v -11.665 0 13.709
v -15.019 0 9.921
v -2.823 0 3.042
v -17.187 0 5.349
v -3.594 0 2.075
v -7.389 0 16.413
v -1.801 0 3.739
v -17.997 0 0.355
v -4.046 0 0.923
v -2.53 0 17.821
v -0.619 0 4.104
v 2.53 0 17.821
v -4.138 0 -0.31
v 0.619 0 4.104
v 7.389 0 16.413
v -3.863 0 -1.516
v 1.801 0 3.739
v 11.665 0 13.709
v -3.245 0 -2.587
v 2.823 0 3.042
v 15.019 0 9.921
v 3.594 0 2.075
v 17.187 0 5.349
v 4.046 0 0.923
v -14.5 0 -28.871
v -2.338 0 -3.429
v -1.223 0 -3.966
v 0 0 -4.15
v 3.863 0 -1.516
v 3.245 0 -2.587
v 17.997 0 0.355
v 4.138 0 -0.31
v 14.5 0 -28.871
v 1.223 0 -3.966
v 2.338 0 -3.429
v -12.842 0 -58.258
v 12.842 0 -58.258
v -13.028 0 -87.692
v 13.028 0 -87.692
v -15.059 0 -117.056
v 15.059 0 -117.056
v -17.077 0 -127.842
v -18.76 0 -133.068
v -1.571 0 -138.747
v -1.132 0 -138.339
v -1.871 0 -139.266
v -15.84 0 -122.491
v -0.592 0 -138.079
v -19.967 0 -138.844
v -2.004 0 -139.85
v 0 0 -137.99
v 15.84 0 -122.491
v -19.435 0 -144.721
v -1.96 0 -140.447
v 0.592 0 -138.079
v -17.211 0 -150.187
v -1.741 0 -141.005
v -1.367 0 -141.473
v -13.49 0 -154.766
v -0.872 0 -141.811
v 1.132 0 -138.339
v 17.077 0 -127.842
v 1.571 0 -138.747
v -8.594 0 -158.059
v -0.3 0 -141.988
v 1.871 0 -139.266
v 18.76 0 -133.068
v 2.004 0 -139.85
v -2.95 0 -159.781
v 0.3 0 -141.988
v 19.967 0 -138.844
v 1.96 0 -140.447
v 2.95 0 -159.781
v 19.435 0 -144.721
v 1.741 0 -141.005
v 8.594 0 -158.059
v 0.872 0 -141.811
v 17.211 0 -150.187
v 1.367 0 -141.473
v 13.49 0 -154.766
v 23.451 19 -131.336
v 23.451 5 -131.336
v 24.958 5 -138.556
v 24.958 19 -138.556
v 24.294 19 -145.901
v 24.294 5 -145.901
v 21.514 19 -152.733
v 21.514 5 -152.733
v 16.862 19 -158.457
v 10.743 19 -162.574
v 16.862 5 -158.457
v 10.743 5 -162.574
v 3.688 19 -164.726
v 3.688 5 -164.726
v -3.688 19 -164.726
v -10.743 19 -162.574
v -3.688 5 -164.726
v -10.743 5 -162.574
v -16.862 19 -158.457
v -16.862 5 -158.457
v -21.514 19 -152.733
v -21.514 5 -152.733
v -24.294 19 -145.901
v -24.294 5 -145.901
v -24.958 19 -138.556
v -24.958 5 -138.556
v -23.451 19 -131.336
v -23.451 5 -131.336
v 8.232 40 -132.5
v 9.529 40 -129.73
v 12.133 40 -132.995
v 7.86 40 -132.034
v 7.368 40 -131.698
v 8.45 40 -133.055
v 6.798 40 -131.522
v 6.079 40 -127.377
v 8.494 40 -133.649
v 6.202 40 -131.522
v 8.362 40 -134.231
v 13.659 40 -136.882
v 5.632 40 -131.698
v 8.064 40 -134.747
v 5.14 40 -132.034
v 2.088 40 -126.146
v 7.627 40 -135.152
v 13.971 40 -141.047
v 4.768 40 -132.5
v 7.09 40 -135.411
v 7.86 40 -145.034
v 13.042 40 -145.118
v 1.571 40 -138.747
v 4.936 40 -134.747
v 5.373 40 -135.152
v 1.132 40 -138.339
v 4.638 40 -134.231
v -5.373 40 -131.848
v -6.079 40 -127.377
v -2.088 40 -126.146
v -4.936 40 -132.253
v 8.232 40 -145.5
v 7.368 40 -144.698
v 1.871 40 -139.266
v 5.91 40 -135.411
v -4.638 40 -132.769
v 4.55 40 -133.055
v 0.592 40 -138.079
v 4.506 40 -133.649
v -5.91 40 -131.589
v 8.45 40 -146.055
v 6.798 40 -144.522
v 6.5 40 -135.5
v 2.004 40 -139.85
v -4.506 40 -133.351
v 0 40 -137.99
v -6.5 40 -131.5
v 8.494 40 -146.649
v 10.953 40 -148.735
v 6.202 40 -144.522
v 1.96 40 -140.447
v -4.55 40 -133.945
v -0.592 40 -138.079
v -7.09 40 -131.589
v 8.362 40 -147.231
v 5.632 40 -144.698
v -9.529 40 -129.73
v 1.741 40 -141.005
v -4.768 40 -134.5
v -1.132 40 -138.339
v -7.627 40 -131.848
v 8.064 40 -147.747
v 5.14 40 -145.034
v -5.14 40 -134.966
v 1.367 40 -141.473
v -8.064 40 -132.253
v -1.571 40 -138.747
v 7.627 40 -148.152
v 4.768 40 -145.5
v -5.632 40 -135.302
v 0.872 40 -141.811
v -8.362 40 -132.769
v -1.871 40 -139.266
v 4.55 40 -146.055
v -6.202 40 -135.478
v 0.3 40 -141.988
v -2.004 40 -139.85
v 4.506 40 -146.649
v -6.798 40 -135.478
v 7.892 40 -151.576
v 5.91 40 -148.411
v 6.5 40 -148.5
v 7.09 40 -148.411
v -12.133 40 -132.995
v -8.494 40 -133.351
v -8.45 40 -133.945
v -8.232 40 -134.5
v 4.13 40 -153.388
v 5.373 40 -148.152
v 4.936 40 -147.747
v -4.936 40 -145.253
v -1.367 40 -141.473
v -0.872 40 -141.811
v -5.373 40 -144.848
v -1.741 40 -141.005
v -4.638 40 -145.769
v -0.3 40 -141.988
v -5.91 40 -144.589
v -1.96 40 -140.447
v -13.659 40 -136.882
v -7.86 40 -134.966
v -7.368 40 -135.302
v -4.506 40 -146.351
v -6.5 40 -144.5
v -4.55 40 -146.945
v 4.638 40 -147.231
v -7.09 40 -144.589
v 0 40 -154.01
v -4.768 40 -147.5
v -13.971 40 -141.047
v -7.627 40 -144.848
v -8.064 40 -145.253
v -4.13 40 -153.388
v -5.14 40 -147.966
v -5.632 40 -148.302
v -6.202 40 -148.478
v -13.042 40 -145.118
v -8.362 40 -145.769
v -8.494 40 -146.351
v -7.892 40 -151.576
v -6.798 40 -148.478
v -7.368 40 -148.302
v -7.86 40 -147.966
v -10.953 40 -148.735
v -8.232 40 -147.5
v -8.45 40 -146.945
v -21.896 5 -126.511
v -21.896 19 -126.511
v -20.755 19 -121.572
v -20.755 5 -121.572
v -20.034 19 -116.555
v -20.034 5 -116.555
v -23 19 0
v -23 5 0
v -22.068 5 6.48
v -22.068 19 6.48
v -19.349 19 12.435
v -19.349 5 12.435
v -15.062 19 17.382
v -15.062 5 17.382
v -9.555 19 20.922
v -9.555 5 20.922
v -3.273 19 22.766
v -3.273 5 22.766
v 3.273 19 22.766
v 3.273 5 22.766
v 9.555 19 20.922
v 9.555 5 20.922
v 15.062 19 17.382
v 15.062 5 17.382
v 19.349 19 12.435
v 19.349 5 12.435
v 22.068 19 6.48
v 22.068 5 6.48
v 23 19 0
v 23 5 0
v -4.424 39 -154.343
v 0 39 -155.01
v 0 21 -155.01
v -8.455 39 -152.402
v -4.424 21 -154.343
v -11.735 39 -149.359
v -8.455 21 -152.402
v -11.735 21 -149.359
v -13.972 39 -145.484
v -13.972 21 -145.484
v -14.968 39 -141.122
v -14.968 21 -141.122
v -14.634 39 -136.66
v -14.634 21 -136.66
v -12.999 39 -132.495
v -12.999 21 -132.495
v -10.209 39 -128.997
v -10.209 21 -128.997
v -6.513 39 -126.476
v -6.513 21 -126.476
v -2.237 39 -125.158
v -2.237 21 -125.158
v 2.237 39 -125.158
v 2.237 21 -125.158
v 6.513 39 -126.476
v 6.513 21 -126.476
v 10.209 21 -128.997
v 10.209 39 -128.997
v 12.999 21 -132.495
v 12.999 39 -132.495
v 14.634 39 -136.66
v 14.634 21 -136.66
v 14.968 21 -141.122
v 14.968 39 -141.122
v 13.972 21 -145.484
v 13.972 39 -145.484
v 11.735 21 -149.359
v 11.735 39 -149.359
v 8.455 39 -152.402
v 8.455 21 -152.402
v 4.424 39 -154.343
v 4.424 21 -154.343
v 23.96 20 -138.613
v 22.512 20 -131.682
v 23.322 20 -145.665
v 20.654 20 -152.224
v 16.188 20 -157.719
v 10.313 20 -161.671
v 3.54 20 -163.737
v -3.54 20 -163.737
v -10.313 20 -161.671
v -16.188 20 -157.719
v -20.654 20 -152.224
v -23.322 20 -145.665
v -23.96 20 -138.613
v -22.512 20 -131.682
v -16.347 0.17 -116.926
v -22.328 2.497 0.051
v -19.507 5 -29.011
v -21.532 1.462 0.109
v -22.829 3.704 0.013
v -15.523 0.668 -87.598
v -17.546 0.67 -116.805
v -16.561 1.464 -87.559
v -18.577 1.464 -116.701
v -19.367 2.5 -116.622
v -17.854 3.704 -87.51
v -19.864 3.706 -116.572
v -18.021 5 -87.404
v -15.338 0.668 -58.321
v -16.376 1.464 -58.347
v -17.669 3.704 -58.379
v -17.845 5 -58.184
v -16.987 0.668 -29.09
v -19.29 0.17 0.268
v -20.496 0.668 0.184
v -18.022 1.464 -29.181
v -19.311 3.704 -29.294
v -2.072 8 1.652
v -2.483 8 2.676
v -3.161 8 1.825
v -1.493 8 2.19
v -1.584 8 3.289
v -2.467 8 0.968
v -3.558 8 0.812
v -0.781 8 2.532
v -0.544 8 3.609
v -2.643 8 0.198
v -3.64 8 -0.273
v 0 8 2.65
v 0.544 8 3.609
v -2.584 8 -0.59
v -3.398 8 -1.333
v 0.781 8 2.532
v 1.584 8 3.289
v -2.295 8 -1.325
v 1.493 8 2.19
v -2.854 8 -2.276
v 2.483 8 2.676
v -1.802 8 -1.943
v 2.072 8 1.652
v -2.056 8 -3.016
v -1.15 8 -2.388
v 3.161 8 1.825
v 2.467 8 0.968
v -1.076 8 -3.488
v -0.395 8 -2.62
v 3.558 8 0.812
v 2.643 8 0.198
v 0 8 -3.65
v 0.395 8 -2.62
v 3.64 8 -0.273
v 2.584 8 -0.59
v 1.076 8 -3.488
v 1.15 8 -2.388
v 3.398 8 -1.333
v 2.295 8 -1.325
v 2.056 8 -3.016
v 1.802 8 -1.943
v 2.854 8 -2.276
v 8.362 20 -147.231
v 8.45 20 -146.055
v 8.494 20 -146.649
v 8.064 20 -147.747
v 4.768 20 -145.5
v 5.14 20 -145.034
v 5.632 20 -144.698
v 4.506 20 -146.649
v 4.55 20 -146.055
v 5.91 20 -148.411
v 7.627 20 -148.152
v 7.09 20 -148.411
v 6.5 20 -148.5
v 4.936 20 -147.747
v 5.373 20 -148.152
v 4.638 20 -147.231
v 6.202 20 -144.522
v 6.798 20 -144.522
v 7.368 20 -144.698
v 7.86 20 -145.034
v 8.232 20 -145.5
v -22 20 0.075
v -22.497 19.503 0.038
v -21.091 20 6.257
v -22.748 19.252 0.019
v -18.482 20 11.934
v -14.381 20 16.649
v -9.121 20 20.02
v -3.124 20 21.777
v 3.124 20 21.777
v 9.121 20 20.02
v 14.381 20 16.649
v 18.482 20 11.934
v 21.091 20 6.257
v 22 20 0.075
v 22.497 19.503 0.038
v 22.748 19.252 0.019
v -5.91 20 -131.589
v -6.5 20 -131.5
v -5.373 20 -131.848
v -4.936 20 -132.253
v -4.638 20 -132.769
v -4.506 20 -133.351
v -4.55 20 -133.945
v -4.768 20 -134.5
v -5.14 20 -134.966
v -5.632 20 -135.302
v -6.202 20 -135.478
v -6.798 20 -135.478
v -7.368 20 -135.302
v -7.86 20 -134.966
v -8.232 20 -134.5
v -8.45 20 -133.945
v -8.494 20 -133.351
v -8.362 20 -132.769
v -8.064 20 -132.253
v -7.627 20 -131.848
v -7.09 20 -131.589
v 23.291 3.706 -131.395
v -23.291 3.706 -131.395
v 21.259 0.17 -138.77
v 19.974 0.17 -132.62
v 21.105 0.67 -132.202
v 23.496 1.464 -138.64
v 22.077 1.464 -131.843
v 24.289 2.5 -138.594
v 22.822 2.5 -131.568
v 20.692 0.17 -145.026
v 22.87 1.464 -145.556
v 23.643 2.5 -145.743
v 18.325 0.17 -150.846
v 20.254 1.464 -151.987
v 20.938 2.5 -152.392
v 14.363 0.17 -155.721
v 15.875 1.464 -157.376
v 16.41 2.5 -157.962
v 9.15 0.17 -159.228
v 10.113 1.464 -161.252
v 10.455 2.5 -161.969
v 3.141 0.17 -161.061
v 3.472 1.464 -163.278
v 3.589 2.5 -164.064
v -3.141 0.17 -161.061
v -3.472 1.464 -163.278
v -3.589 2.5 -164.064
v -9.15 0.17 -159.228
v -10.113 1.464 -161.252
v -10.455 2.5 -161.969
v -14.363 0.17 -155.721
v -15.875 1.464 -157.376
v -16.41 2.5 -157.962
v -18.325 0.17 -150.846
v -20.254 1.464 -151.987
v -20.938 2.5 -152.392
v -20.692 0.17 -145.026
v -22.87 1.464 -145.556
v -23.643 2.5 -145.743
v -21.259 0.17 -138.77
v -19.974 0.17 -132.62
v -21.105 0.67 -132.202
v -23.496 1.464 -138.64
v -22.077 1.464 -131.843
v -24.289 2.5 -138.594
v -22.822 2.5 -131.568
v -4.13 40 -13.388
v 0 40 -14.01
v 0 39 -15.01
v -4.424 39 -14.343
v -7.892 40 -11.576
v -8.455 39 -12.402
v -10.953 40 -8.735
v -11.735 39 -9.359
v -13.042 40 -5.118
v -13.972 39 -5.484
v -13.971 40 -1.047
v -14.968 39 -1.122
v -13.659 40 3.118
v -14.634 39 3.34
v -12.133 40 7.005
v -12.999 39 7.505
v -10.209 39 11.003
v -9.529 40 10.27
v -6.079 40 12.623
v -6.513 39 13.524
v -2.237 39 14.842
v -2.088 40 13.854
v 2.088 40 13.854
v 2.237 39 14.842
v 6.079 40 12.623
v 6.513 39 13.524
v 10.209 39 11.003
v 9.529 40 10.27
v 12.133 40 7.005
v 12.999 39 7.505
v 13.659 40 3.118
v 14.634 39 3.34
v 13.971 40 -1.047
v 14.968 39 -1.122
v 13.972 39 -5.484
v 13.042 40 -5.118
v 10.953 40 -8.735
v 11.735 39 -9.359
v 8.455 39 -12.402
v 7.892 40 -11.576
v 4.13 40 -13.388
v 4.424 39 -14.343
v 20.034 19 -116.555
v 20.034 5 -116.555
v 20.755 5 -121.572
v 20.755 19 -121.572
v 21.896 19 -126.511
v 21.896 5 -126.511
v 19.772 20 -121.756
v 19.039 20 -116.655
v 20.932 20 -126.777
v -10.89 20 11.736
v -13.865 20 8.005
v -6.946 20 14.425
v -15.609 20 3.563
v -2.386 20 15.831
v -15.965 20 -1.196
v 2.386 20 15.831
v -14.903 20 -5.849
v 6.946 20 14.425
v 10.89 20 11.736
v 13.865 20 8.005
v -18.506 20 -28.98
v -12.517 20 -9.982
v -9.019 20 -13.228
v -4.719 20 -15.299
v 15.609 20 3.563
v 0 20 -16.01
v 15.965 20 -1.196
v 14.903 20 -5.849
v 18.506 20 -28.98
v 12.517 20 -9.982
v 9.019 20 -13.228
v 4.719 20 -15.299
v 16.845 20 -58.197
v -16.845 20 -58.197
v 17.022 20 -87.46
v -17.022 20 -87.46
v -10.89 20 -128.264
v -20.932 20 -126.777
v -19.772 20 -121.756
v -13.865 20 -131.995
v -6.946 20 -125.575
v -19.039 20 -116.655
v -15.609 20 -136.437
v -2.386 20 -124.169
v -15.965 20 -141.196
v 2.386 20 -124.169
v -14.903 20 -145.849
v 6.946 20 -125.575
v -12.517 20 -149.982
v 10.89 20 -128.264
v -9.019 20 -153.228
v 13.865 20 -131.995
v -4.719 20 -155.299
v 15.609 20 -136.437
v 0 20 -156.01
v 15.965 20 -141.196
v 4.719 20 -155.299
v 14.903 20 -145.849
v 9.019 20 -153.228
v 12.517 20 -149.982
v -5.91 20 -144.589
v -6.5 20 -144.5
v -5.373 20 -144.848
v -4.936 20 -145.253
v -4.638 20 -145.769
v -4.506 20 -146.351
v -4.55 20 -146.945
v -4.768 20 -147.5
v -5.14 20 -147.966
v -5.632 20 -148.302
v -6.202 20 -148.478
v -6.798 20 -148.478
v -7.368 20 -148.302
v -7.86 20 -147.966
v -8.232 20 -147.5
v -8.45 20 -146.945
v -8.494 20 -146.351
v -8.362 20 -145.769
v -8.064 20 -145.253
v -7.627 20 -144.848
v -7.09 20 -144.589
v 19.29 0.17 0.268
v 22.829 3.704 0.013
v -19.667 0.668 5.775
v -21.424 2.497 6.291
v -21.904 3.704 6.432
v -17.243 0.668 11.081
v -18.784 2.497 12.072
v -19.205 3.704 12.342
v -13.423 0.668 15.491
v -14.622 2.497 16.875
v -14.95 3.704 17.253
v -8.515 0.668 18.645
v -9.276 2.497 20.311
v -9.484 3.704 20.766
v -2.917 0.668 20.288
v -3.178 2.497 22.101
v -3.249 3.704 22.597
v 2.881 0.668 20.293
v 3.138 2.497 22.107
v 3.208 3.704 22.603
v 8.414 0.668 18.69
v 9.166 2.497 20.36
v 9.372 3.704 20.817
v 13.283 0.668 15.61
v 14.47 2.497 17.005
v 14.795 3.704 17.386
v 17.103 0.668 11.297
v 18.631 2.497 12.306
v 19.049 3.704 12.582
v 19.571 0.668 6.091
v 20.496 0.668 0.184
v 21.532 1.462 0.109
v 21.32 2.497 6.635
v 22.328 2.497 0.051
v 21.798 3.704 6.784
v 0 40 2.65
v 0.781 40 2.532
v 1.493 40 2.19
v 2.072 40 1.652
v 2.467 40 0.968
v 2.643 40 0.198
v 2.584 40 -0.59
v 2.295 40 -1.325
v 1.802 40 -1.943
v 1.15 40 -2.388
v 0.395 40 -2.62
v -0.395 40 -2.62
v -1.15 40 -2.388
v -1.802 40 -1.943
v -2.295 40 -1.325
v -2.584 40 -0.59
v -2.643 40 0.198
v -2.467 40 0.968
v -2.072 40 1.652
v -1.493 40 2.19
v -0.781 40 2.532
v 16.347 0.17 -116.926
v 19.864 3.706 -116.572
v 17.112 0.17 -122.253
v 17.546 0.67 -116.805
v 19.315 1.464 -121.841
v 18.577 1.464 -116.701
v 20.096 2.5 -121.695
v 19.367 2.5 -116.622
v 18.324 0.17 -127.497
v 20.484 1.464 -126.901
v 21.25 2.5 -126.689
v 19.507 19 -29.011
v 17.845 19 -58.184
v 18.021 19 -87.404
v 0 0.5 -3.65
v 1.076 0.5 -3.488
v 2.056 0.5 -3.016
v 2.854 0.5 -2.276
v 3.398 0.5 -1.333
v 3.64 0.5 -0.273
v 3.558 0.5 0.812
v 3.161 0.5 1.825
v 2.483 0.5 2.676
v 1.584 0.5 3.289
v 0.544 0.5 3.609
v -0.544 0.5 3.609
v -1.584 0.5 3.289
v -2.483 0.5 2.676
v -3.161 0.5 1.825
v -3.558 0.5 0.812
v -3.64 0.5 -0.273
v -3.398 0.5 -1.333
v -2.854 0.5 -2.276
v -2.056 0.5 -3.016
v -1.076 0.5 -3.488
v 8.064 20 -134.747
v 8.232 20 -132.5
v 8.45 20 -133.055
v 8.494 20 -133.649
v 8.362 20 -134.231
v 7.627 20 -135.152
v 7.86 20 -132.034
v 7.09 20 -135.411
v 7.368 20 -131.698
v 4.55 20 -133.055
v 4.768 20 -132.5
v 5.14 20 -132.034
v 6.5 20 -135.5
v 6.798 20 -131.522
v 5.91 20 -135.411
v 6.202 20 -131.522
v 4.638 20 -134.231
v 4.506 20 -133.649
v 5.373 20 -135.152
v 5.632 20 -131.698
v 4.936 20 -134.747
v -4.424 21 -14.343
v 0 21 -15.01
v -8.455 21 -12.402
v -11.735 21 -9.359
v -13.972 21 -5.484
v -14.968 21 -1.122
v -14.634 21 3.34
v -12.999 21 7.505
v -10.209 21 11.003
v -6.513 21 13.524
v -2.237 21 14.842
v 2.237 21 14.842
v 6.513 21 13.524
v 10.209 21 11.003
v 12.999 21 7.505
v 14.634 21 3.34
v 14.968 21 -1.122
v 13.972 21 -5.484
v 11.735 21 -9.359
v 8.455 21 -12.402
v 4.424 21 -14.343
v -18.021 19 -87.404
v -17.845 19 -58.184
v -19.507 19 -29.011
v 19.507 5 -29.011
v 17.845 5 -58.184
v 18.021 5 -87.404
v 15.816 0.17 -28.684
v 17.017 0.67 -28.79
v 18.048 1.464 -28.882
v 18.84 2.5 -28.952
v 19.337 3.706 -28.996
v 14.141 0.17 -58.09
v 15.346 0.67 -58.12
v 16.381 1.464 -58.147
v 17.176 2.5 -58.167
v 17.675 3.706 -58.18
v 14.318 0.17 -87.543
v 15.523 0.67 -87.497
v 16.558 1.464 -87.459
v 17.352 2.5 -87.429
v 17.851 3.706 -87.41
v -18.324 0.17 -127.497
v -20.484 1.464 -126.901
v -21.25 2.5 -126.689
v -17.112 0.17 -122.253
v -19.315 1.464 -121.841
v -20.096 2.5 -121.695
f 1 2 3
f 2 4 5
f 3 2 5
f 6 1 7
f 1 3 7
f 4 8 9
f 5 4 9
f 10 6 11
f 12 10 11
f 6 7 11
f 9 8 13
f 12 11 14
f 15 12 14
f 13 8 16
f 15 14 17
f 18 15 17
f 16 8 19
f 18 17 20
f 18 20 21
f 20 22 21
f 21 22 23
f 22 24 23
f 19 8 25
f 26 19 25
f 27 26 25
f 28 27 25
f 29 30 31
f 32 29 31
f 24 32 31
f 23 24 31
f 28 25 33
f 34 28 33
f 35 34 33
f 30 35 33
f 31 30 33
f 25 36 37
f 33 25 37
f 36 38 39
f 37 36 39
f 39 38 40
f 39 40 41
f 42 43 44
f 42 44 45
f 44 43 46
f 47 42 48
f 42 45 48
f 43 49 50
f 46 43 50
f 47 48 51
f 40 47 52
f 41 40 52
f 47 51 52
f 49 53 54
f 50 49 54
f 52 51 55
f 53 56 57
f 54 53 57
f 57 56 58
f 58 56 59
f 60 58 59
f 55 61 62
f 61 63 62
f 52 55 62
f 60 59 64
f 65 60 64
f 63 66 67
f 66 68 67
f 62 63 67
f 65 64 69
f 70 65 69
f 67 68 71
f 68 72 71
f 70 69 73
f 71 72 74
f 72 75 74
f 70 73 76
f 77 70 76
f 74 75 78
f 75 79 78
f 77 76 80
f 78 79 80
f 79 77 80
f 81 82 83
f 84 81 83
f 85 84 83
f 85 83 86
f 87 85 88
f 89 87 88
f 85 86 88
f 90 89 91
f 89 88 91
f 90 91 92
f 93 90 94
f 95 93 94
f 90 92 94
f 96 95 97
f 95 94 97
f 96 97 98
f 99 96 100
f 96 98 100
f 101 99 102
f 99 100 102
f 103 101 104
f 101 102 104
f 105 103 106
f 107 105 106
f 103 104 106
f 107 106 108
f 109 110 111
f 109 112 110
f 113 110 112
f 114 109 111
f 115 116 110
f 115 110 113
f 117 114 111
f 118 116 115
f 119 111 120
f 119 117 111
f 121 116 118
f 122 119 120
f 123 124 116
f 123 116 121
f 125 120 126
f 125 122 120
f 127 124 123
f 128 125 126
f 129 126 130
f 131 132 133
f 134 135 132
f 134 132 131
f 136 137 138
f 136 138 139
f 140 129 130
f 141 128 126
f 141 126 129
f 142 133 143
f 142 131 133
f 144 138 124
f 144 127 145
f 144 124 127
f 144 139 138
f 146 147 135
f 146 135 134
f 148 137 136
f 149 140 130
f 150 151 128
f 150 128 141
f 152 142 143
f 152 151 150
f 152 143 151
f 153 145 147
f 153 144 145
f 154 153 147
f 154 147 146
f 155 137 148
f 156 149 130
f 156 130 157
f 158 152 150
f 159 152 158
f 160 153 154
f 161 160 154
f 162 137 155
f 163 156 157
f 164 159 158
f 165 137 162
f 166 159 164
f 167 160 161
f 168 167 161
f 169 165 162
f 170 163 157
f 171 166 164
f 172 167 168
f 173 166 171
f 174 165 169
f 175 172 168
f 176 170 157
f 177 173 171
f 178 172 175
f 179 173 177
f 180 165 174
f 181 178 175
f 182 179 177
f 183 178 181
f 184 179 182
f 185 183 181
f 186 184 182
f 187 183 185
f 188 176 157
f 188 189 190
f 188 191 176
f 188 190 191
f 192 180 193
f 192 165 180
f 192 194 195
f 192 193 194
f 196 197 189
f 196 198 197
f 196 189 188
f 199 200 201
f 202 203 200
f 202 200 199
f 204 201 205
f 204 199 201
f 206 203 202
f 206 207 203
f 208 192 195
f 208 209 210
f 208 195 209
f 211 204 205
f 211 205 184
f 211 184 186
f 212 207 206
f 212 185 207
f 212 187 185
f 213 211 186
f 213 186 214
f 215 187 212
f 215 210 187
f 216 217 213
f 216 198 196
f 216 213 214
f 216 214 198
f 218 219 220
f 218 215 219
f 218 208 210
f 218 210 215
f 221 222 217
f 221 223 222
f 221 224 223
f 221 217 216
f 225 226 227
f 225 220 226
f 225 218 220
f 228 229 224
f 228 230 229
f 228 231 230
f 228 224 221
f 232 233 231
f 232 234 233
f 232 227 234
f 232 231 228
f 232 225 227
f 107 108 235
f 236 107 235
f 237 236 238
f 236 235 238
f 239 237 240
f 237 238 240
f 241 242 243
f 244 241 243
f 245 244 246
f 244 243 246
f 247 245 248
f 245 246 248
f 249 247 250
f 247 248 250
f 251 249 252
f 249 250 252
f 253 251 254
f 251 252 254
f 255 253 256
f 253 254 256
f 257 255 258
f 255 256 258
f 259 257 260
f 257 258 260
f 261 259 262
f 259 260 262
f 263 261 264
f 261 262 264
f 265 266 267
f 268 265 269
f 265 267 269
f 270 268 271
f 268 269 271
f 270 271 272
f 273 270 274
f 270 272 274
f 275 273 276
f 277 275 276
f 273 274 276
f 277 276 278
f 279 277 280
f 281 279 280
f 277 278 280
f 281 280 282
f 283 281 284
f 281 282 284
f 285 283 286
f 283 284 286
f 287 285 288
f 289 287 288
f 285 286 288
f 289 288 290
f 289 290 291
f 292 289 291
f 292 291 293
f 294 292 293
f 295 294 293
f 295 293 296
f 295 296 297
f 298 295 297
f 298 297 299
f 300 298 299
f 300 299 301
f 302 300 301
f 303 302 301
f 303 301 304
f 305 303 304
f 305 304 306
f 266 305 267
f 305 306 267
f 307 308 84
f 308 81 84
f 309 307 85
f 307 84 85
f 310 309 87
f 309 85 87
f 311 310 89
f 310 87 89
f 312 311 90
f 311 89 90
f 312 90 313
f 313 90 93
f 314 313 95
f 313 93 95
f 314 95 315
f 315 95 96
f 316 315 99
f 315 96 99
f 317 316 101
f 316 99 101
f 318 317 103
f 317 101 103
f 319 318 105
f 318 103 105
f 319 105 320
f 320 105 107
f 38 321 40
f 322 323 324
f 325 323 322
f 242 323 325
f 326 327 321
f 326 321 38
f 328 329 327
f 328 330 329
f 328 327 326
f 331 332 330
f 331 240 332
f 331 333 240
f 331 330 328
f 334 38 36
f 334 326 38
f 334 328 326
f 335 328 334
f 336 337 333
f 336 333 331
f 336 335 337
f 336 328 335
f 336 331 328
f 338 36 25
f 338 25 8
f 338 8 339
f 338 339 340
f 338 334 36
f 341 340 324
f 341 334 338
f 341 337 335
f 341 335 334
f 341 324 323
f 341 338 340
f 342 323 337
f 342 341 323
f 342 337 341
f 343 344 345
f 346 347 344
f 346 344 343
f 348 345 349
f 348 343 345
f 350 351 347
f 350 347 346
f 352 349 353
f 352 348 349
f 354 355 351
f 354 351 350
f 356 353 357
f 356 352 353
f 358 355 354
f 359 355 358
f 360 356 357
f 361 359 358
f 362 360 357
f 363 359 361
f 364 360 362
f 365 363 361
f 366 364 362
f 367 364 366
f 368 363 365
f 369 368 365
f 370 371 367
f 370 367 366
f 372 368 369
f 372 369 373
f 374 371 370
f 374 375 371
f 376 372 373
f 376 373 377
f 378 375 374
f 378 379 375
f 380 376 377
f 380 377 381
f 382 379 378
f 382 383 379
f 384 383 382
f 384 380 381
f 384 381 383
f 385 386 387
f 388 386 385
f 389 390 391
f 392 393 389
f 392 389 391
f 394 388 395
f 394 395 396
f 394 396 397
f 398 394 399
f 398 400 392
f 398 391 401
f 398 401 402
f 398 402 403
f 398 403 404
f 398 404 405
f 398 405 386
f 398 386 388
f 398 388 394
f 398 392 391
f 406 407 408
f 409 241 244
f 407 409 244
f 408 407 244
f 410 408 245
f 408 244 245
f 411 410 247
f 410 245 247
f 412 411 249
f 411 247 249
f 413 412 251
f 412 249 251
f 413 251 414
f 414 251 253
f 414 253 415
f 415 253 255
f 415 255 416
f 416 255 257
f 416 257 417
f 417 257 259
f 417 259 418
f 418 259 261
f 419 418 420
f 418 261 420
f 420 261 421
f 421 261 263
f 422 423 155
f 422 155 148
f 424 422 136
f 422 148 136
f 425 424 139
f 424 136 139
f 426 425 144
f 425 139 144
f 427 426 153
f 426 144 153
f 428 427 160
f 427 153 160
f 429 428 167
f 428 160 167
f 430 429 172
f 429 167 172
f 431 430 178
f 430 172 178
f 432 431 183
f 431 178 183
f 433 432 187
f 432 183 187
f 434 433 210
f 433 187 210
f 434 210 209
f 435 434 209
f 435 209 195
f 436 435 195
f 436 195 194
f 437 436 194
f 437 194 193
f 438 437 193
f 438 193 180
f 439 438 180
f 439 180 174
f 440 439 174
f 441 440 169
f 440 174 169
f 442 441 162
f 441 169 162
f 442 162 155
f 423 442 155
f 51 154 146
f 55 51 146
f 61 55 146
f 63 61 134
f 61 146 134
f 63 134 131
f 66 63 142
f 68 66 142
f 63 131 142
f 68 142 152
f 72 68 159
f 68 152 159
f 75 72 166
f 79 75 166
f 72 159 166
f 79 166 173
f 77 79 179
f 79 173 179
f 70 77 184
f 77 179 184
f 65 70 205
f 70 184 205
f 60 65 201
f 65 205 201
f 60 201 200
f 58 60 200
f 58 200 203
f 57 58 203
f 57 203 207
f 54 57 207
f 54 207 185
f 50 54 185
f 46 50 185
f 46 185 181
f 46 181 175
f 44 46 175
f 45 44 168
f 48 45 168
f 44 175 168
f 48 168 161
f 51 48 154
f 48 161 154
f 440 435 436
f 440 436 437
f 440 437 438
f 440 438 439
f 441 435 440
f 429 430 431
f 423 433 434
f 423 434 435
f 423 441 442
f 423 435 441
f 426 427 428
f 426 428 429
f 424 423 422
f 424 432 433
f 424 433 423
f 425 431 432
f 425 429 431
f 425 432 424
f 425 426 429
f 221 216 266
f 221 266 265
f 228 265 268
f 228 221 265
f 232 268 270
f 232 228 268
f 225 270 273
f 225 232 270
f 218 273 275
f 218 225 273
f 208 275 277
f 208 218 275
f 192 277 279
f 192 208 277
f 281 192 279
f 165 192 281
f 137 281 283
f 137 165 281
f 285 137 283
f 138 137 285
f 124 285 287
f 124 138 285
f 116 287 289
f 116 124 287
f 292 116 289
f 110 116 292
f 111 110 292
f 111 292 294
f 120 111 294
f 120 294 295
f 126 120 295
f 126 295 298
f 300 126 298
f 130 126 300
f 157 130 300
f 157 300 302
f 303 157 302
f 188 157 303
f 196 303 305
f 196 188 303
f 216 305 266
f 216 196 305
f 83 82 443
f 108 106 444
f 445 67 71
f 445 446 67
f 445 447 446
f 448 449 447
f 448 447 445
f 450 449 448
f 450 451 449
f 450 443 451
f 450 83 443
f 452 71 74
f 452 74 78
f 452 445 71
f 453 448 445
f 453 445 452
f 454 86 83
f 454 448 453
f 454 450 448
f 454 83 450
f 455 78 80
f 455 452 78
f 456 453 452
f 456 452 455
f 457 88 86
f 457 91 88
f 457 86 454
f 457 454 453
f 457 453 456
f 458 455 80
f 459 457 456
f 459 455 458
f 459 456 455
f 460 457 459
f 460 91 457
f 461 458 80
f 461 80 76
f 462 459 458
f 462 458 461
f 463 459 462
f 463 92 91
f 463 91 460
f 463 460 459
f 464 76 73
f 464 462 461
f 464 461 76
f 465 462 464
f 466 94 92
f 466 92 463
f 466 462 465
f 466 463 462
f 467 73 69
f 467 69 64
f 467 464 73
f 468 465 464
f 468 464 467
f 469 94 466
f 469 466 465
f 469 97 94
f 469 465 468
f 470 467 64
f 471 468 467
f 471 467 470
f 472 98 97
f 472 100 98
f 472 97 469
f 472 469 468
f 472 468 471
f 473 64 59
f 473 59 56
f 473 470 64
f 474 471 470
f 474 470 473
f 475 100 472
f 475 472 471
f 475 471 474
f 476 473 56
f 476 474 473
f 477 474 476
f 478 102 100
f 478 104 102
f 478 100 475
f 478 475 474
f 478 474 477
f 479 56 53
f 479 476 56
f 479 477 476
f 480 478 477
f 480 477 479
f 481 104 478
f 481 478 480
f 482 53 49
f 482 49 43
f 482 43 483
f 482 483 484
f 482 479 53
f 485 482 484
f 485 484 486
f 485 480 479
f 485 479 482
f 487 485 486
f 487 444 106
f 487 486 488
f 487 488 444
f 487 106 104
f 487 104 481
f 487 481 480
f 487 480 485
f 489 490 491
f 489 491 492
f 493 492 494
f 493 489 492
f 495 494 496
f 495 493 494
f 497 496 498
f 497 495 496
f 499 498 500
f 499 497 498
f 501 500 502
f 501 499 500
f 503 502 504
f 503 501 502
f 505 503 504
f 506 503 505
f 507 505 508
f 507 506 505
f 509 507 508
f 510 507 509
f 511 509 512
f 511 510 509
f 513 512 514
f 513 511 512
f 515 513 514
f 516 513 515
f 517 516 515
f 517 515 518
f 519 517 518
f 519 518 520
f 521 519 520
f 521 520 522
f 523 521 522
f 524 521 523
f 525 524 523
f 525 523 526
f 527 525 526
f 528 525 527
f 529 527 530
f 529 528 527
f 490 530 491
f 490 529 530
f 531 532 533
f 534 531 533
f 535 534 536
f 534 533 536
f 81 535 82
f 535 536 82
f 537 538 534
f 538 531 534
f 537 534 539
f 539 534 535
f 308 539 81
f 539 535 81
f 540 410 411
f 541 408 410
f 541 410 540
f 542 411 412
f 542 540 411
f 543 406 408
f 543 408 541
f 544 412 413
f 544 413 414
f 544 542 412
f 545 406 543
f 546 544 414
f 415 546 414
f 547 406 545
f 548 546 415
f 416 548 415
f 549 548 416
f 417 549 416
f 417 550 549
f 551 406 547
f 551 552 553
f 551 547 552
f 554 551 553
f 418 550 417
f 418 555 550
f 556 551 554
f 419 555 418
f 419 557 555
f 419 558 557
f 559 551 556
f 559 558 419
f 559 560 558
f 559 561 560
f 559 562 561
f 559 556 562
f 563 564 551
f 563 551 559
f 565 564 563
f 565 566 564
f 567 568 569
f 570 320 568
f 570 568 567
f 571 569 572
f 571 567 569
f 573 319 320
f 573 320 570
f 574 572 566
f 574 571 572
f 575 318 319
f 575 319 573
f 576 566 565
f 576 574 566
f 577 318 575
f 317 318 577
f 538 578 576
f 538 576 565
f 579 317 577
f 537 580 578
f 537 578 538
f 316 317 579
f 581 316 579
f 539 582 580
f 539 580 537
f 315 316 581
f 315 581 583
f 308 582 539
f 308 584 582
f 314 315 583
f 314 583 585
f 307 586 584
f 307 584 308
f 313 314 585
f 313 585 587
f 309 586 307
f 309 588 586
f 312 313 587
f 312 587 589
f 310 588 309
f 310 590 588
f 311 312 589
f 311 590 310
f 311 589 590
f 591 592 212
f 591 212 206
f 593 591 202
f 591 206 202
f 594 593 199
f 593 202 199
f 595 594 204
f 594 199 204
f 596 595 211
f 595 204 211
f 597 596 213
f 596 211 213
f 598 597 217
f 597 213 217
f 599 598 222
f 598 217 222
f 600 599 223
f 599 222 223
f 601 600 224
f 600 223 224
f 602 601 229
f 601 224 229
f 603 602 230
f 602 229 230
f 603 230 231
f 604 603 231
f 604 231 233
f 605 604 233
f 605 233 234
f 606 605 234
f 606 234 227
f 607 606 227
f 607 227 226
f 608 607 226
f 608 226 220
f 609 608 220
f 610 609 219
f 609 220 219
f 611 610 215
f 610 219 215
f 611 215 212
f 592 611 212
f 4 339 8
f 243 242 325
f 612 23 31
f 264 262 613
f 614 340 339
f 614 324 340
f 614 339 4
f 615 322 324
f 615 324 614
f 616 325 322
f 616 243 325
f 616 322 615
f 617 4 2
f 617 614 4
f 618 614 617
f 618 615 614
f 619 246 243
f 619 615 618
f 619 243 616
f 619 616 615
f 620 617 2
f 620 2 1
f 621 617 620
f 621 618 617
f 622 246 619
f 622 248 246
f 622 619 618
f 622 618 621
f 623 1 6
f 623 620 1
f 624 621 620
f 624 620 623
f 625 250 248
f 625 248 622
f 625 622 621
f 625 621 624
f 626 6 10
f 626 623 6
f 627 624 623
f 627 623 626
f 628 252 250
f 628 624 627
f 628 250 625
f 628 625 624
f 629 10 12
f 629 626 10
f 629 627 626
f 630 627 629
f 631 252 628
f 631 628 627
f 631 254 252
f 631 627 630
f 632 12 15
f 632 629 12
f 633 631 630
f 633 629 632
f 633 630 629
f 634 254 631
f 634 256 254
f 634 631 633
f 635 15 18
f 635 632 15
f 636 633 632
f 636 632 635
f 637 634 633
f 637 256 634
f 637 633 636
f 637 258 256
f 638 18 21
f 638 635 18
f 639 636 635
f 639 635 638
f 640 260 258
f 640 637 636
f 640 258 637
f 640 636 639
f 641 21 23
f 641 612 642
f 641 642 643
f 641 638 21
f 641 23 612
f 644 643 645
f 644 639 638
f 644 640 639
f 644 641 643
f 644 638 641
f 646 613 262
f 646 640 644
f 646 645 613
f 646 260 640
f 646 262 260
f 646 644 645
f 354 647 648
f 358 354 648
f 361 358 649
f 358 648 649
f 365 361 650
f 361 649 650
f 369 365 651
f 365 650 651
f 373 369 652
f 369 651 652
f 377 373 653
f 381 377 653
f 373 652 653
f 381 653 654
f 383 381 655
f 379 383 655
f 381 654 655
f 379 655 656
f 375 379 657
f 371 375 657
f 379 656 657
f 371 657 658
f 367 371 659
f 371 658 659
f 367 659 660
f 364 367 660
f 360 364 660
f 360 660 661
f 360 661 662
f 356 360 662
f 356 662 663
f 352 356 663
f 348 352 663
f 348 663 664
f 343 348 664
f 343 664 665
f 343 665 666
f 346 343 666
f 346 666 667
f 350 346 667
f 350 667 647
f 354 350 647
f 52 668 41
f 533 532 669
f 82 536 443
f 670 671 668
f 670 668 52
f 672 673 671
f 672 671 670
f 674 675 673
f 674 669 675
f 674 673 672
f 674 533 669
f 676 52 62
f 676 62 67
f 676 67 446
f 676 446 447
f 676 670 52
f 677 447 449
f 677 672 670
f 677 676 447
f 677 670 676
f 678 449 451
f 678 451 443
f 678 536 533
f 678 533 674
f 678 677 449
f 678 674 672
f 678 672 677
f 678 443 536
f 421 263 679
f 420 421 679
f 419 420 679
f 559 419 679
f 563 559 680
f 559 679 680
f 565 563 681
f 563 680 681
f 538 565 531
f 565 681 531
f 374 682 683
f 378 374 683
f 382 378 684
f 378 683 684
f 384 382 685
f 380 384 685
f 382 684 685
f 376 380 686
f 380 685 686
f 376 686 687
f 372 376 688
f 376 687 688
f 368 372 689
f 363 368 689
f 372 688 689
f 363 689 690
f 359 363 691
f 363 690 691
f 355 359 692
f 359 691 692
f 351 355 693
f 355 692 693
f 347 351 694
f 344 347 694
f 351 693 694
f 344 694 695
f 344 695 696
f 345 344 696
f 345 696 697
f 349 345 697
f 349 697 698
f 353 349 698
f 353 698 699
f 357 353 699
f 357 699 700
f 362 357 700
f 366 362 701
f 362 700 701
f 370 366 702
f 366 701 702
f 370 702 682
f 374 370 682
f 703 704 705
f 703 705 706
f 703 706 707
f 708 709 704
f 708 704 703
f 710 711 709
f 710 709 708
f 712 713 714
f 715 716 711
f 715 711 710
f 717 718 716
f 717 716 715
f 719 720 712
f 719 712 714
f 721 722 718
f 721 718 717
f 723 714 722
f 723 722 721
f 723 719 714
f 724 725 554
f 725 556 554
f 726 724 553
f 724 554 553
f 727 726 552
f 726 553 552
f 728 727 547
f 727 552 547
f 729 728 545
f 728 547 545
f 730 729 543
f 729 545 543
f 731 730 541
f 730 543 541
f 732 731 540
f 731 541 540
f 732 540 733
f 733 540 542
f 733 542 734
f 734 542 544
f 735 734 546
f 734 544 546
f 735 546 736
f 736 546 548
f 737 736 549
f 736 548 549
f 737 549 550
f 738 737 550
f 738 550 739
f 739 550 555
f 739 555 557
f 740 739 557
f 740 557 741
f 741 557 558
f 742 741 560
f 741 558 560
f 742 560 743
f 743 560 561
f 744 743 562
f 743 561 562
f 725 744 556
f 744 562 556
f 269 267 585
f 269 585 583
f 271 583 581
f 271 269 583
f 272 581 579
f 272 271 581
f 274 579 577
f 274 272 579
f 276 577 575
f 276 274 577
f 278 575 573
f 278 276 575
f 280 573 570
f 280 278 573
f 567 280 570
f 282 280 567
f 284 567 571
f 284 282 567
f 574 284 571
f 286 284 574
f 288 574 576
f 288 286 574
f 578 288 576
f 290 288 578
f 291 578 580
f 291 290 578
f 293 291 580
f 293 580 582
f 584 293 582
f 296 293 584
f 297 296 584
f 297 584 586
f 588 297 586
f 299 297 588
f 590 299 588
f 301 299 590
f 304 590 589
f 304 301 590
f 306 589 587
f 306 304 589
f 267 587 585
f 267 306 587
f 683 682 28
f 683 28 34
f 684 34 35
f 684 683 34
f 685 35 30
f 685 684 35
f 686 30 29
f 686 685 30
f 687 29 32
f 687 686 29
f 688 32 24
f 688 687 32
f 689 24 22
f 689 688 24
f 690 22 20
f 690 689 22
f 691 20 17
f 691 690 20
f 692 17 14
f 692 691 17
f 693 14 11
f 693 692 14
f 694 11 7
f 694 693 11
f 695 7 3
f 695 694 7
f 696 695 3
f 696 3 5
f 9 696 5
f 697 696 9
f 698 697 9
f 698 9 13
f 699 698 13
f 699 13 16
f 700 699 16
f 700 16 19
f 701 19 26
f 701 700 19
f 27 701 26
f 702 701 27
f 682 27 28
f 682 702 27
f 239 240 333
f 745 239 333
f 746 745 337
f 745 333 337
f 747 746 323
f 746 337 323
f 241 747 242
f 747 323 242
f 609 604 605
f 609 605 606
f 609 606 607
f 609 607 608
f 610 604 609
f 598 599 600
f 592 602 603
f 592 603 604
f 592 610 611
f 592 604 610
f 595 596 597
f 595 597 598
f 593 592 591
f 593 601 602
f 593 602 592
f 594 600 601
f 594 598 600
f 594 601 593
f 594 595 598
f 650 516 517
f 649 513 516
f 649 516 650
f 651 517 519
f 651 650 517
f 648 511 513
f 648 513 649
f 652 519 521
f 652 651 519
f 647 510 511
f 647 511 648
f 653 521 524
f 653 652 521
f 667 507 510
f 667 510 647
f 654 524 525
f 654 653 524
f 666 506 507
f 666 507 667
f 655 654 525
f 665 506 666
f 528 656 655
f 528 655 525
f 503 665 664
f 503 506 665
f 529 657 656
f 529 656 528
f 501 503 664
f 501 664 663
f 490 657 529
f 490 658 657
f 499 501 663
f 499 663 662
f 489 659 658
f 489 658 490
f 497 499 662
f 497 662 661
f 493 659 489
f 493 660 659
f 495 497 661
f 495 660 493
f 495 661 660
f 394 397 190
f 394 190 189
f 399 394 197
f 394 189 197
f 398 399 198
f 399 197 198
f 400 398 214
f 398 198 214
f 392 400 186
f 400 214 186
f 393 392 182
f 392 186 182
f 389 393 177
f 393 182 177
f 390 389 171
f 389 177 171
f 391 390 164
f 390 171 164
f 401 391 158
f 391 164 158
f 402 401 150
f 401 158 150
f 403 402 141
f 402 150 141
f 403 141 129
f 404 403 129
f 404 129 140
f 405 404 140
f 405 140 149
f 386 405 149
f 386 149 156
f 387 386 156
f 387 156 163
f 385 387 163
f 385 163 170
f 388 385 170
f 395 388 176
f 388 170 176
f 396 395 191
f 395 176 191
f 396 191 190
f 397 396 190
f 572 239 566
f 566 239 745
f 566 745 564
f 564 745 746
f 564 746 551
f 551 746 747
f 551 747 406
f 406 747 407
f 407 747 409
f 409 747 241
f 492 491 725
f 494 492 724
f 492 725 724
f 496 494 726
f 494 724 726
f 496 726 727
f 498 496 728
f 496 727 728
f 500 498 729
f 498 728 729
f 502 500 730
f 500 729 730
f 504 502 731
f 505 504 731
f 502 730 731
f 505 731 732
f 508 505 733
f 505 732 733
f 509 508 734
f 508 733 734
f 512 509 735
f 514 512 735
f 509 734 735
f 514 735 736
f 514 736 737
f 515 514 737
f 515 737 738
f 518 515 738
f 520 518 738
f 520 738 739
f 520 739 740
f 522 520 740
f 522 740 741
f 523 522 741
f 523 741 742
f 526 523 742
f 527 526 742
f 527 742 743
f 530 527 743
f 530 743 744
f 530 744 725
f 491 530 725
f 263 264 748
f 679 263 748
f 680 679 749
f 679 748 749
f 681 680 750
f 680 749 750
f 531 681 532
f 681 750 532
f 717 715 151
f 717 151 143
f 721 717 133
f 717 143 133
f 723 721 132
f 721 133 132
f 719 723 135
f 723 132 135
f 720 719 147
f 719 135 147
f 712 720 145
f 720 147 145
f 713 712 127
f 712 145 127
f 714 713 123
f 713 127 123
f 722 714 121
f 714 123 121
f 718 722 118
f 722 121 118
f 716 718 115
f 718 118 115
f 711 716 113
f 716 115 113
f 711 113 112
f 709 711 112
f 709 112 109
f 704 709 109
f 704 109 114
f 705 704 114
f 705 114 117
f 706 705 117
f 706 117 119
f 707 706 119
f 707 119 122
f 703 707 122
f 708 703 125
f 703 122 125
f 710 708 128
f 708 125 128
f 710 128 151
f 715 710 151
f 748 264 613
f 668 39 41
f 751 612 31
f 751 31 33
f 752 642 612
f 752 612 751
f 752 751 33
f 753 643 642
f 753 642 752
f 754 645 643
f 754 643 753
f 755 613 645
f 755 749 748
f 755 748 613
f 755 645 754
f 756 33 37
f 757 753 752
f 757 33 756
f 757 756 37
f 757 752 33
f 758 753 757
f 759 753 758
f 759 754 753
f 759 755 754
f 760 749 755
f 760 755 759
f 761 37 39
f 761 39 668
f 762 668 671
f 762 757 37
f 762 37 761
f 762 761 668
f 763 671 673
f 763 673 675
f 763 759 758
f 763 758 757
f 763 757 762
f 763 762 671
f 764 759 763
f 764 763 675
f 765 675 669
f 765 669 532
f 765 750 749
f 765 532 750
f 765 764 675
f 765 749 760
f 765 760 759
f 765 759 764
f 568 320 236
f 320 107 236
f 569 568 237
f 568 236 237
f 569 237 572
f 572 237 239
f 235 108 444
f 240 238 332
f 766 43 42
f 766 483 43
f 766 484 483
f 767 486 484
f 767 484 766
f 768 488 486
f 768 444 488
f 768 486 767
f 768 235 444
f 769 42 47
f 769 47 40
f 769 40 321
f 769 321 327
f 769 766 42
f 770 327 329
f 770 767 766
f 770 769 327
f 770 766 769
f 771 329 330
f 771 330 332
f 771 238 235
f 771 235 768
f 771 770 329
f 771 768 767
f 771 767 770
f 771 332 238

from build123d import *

# Parameters (mm, degrees)
BOSS_EXTRUDE1_DEPTH = 20
SKETCH2_R           = 15.01
BOSS_EXTRUDE2_DEPTH = 20
CHAMFER1_SIZE       = 1
CHAMFER3_SIZE       = 1
SKETCH5_R           = 2.65
CUT_EXTRUDE2_DEPTH  = 40
FILLET3_R           = 5
SKETCH6_R           = 3.65
CUT_EXTRUDE3_DEPTH  = 8
CHAMFER4_SIZE       = 0.5
SKETCH10_R          = 15.01
BOSS_EXTRUDE5_DEPTH = 20
CHAMFER5_SIZE       = 1
SKETCH11_R          = 2.0099999999999967
CUT_EXTRUDE5_DEPTH  = 40
SKETCH12_R          = 2.0000000000000018
SKETCH12_R_2        = 2.000000000000005
SKETCH12_R_3        = 1.9999999999999967
CUT_EXTRUDE6_DEPTH  = 19.999999999999996


with BuildPart() as part:
    # Sketch1 → Boss-Extrude1 (new body)
    with BuildSketch(Plane(origin=(0, 0, 0), x_dir=(1, 0, 0), z_dir=(0, 1, 0))):
        with BuildLine():
            ThreePointArc((-23, 0), (1.41e-15, -22.999999999999982), (23, 0))
            ThreePointArc((23, 0), (17.845208734768505, 58.18386045047181), (20.033890701411753, 116.55459936267802))
            ThreePointArc((20.033890701411753, 116.55459936267802), (21.27316153822275, 124.05347023326534), (23.45051159720983, 131.33550314045155))
            ThreePointArc((23.45051159720983, 131.33550314045155), (-2.067e-14, 165.00000000000006), (-23.45051159720983, 131.3355031404515))
            ThreePointArc((-23.45051159720983, 131.3355031404515), (-21.27316153822273, 124.05347023326526), (-20.033890701411725, 116.55459936267786))
            ThreePointArc((-20.033890701411725, 116.55459936267786), (-17.845208734768505, 58.1838604504716), (-23, 0))
        make_face()
    extrude(amount=BOSS_EXTRUDE1_DEPTH)

    # Sketch2 → Boss-Extrude2 (add)
    with BuildSketch(Plane(origin=(0, 20, 0), x_dir=(1, 0, 0), z_dir=(0, 1, 0))):
        with Locations(Location((0, 0, 0), (0, 0, 90))):
            Circle(SKETCH2_R)
    extrude(amount=BOSS_EXTRUDE2_DEPTH)

    # Chamfer1
    chamfer1_edges = [part.edges().sort_by_distance(p)[0] for p in [
        (-2.76e-15, 40, 15.01),
    ]]
    chamfer(chamfer1_edges, length=CHAMFER1_SIZE)

    # Chamfer3
    # the kernel refuses this chamfer: 1 mm, written as the material it adds along each edge
    with BuildSketch(Plane(origin=(0, 20, 0), x_dir=(6e-17, 0, -1), z_dir=(1, 0, 6e-17))) as chamfer3_piece_1:
        Polygon((15.01, CHAMFER3_SIZE), (15.01 + CHAMFER3_SIZE, 0), (15.01, 0), align=None)
    revolve(axis=Axis((0, 20, 0), (0, 1, 0)))
    # the kernel refuses this chamfer: 1 mm, written as the material it takes off along each edge
    with BuildSketch(Plane(origin=(-79.73173943051358, 20, -110.54071067753486), x_dir=(0.9380204638883933, 0, -0.3465798743819428), z_dir=(-0.3465798743819428, 0, -0.9380204638883933))) as chamfer3_2_piece_1:
        Polygon((60.00000000000017 + CHAMFER3_SIZE, 0), (60.00000000000017, CHAMFER3_SIZE), (60.00000000000017, 0), align=None)
    revolve(axis=Axis((-79.73173943051358, 20, -110.54071067753486), (0, -1, 0)), revolution_arc=14.525766875036835, mode=Mode.SUBTRACT)
    with BuildSketch(Plane(origin=(-482.16572850262514, 20, -70.00000000000004), x_dir=(0.9949641454850282, 0, -0.1002314780857173), z_dir=(-0.1002314780857173, 0, -0.9949641454850282))) as chamfer3_2_piece_2:
        Polygon((464.4708454051196 + CHAMFER3_SIZE, 0), (464.4708454051196, CHAMFER3_SIZE), (464.4708454051196, 0), align=None)
    revolve(axis=Axis((-482.16572850262514, 20, -70.00000000000004), (0, -1, 0)), revolution_arc=14.737763084908373, mode=Mode.SUBTRACT)
    with BuildSketch(Plane(origin=(0, 20, -1.599e-14), x_dir=(-0.9937354343699007, 0, -0.11175816067592001), z_dir=(0.11175816067592001, 0, -0.9937354343699007))) as chamfer3_2_piece_3:
        Polygon((23.000000000000004 - CHAMFER3_SIZE, 0), (23.000000000000004, -CHAMFER3_SIZE), (23.000000000000004, 0), align=None)
    revolve(axis=Axis((0, 20, -1.599e-14), (0, 1, 0)), revolution_arc=192.83335153216495, mode=Mode.SUBTRACT)
    with BuildSketch(Plane(origin=(482.16572850261997, 20, -69.99999999999986), x_dir=(-0.9877285445231084, 0, 0.15618041597544133), z_dir=(0.15618041597544133, 0, 0.9877285445231084))) as chamfer3_2_piece_4:
        Polygon((464.4708454051149 + CHAMFER3_SIZE, 0), (464.47084540511446, CHAMFER3_SIZE), (464.4708454051149, 0), align=None)
    revolve(axis=Axis((482.16572850261997, 20, -69.99999999999986), (0, -1, 0)), revolution_arc=14.737763084908554, mode=Mode.SUBTRACT)
    with BuildSketch(Plane(origin=(79.7317394305139, 20, -110.54071067753493), x_dir=(-0.9949641454850281, 0, -0.10023147808571735), z_dir=(-0.10023147808571735, 0, 0.9949641454850281))) as chamfer3_2_piece_5:
        Polygon((60.000000000000455 + CHAMFER3_SIZE, 0), (60.000000000000455, CHAMFER3_SIZE), (60.000000000000455, 0), align=None)
    revolve(axis=Axis((79.7317394305139, 20, -110.54071067753493), (0, -1, 0)), revolution_arc=14.525766875036666, mode=Mode.SUBTRACT)
    with BuildSketch(Plane(origin=(9.77e-15, 20, -140.00000000000006), x_dir=(0.9380204638883942, 0, 0.3465798743819405), z_dir=(-0.3465798743819405, 0, 0.9380204638883942))) as chamfer3_2_piece_6:
        Polygon((24.999999999999982 - CHAMFER3_SIZE, 0), (24.999999999999982, -CHAMFER3_SIZE), (24.999999999999982, 0), align=None)
    revolve(axis=Axis((9.77e-15, 20, -140.00000000000006), (0, 1, 0)), revolution_arc=220.55653408148345, mode=Mode.SUBTRACT)

    # Sketch5 → Cut-Extrude2 (cut)
    with BuildSketch(Plane(origin=(0, 40, 0), x_dir=(1, 0, 0), z_dir=(0, 1, 0))):
        with Locations(Location((0, 0, 0), (0, 0, 270))):
            Circle(SKETCH5_R)
    extrude(amount=-CUT_EXTRUDE2_DEPTH, mode=Mode.SUBTRACT)

    # Fillet3
    # the kernel refuses this fillet: 5 mm, written as the material it takes off along each edge
    with BuildSketch(Plane(origin=(482.16572850261997, 0, -69.99999999999986), x_dir=(-0.9868985080370148, 0, 0.1613422909045059), z_dir=(0.1613422909045059, 0, 0.9868985080370148))) as fillet3_piece_1:
        with BuildLine():
            CenterArc((464.4708454051144 + FILLET3_R, -FILLET3_R), FILLET3_R, 89.99999999999935, 90.00000000000068)
            Line((464.4708454051144 + FILLET3_R, 8.9e-16), (464.4708454051144 + FILLET3_R, FILLET3_R * 0.02))
            Line((464.4708454051144 + FILLET3_R, FILLET3_R * 0.02), (464.4708454051144 - FILLET3_R * 0.02, FILLET3_R * 0.02))
            Line((464.4708454051144 - FILLET3_R * 0.02, FILLET3_R * 0.02), (464.4708454051144 - FILLET3_R * 0.02, -FILLET3_R))
            Line((464.4708454051144 - FILLET3_R * 0.02, -FILLET3_R), (464.4708454051144, -FILLET3_R))
        make_face()
    revolve(axis=Axis((482.16572850261997, 0, -69.99999999999986), (0, -1, 0)), revolution_arc=15.03731633345655, mode=Mode.SUBTRACT)
    with BuildSketch(Plane(origin=(0, 0, -1.599e-14), x_dir=(-0.9763879588864252, 0, -0.21602442857603077), z_dir=(0.21602442857603077, 0, -0.9763879588864252))) as fillet3_piece_2:
        with BuildLine():
            CenterArc((23 - FILLET3_R, FILLET3_R), FILLET3_R, 269.99999999999994, 90.00000000000006)
            Line((23 - FILLET3_R, -8.9e-16), (23 - FILLET3_R, -FILLET3_R * 0.02))
            Line((23 - FILLET3_R, -FILLET3_R * 0.02), (23 + FILLET3_R * 0.02, -FILLET3_R * 0.02))
            Line((23 + FILLET3_R * 0.02, -FILLET3_R * 0.02), (23 + FILLET3_R * 0.02, FILLET3_R))
            Line((23 + FILLET3_R * 0.02, FILLET3_R), (23.000000000000004, FILLET3_R))
        make_face()
    revolve(axis=Axis((0, 0, -1.599e-14), (0, 1, 0)), revolution_arc=204.95127041750123, mode=Mode.SUBTRACT)
    with BuildSketch(Plane(origin=(-482.16572850262514, 0, -70.00000000000004), x_dir=(0.9949641454850282, 0, -0.1002314780857173), z_dir=(-0.1002314780857173, 0, -0.9949641454850282))) as fillet3_piece_3:
        with BuildLine():
            CenterArc((464.4708454051196 + FILLET3_R, -FILLET3_R), FILLET3_R, 90, 90)
            Line((464.4708454051196 + FILLET3_R, 8.9e-16), (464.4708454051196 + FILLET3_R, FILLET3_R * 0.02))
            Line((464.4708454051196 + FILLET3_R, FILLET3_R * 0.02), (464.4708454051196 - FILLET3_R * 0.02, FILLET3_R * 0.02))
            Line((464.4708454051196 - FILLET3_R * 0.02, FILLET3_R * 0.02), (464.4708454051196 - FILLET3_R * 0.02, -FILLET3_R))
            Line((464.4708454051196 - FILLET3_R * 0.02, -FILLET3_R), (464.4708454051196, -FILLET3_R))
        make_face()
    revolve(axis=Axis((-482.16572850262514, 0, -70.00000000000004), (0, -1, 0)), revolution_arc=15.037316333456364, mode=Mode.SUBTRACT)
    with BuildSketch(Plane(origin=(-79.73173943051358, 0, -110.54071067753486), x_dir=(0.9380204638883933, 0, -0.3465798743819428), z_dir=(-0.3465798743819428, 0, -0.9380204638883933))) as fillet3_piece_4:
        with BuildLine():
            CenterArc((60.00000000000017 + FILLET3_R, -FILLET3_R), FILLET3_R, 90, 90)
            Line((60.00000000000017 + FILLET3_R, 8.9e-16), (60.00000000000017 + FILLET3_R, FILLET3_R * 0.02))
            Line((60.00000000000017 + FILLET3_R, FILLET3_R * 0.02), (60.00000000000017 - FILLET3_R * 0.02, FILLET3_R * 0.02))
            Line((60.00000000000017 - FILLET3_R * 0.02, FILLET3_R * 0.02), (60.00000000000017 - FILLET3_R * 0.02, -FILLET3_R))
            Line((60.00000000000017 - FILLET3_R * 0.02, -FILLET3_R), (60.00000000000018, -FILLET3_R))
        make_face()
    revolve(axis=Axis((-79.73173943051358, 0, -110.54071067753486), (0, -1, 0)), revolution_arc=14.525766875036835, mode=Mode.SUBTRACT)
    with BuildSketch(Plane(origin=(9.77e-15, 0, -140.00000000000006), x_dir=(0.9380204638883942, 0, 0.3465798743819405), z_dir=(-0.3465798743819405, 0, 0.9380204638883942))) as fillet3_piece_5:
        with BuildLine():
            CenterArc((24.999999999999982 - FILLET3_R, FILLET3_R), FILLET3_R, 270, 90)
            Line((24.999999999999982 - FILLET3_R, -8.9e-16), (24.999999999999982 - FILLET3_R, -FILLET3_R * 0.02))
            Line((24.999999999999982 - FILLET3_R, -FILLET3_R * 0.02), (24.999999999999982 + FILLET3_R * 0.02, -FILLET3_R * 0.02))
            Line((24.999999999999982 + FILLET3_R * 0.02, -FILLET3_R * 0.02), (24.999999999999982 + FILLET3_R * 0.02, FILLET3_R))
            Line((24.999999999999982 + FILLET3_R * 0.02, FILLET3_R), (24.999999999999986, FILLET3_R))
        make_face()
    revolve(axis=Axis((9.77e-15, 0, -140.00000000000006), (0, 1, 0)), revolution_arc=220.55653408148345, mode=Mode.SUBTRACT)
    with BuildSketch(Plane(origin=(79.7317394305139, 0, -110.54071067753493), x_dir=(-0.9949641454850281, 0, -0.10023147808571735), z_dir=(-0.10023147808571735, 0, 0.9949641454850281))) as fillet3_piece_6:
        with BuildLine():
            CenterArc((60.000000000000455 + FILLET3_R, -FILLET3_R), FILLET3_R, 90, 90)
            Line((60.000000000000455 + FILLET3_R, 8.9e-16), (60.000000000000455 + FILLET3_R, FILLET3_R * 0.02))
            Line((60.000000000000455 + FILLET3_R, FILLET3_R * 0.02), (60.000000000000455 - FILLET3_R * 0.02, FILLET3_R * 0.02))
            Line((60.000000000000455 - FILLET3_R * 0.02, FILLET3_R * 0.02), (60.000000000000455 - FILLET3_R * 0.02, -FILLET3_R))
            Line((60.000000000000455 - FILLET3_R * 0.02, -FILLET3_R), (60.000000000000455, -FILLET3_R))
        make_face()
    revolve(axis=Axis((79.7317394305139, 0, -110.54071067753493), (0, -1, 0)), revolution_arc=14.525766875036666, mode=Mode.SUBTRACT)

    # Sketch6 → Cut-Extrude3 (cut)
    with BuildSketch(Plane.XZ):
        with Locations(Location((0, 0, 0), (0, 0, 270))):
            Circle(SKETCH6_R)
    extrude(amount=-CUT_EXTRUDE3_DEPTH, mode=Mode.SUBTRACT)

    # Chamfer4
    chamfer4_edges = [part.edges().sort_by_distance(p)[0] for p in [
        (1.12e-15, 0, 3.65),
    ]]
    chamfer(chamfer4_edges, length=CHAMFER4_SIZE)

    # Sketch10 → Boss-Extrude5 (add)
    with BuildSketch(Plane(origin=(0, 20, 0), x_dir=(1, 0, 0), z_dir=(0, 1, 0))):
        with Locations(Location((0, 140.00000000000009, 0), (0, 0, 90))):
            Circle(SKETCH10_R)
    extrude(amount=BOSS_EXTRUDE5_DEPTH)

    # Chamfer5
    chamfer5_edges = [part.edges().sort_by_distance(p)[0] for p in [
        (-2.76e-15, 20, -124.99000000000008),
        (-2.76e-15, 40, -124.99000000000008),
    ]]
    chamfer(chamfer5_edges, length=CHAMFER5_SIZE)

    # Sketch11 → Cut-Extrude5 (cut)
    with BuildSketch(Plane(origin=(0, 40, 0), x_dir=(1, 0, 0), z_dir=(0, 1, 0))):
        with Locations(Location((0, 140.00000000000009, 0), (0, 0, 270))):
            Circle(SKETCH11_R)
    extrude(amount=-CUT_EXTRUDE5_DEPTH, mode=Mode.SUBTRACT)

    # Sketch12 → Cut-Extrude6 (cut)
    with BuildSketch(Plane(origin=(0, 40, 0), x_dir=(1, 0, 0), z_dir=(0, 1, 0))):
        with Locations(Location((-6.500000000000021, 146.50000000000014, 0), (0, 0, 270))):
            Circle(SKETCH12_R)
        with Locations(Location((-6.4999999999999885, 133.5000000000001, 0), (0, 0, 270))):
            Circle(SKETCH12_R)
        with Locations(Location((6.500000000000011, 133.50000000000009, 0), (0, 0, 90))):
            Circle(SKETCH12_R_2)
        with Locations(Location((6.499999999999978, 146.5000000000001, 0), (0, 0, 90))):
            Circle(SKETCH12_R_3)
    extrude(amount=-CUT_EXTRUDE6_DEPTH, mode=Mode.SUBTRACT)


solid = part.part
